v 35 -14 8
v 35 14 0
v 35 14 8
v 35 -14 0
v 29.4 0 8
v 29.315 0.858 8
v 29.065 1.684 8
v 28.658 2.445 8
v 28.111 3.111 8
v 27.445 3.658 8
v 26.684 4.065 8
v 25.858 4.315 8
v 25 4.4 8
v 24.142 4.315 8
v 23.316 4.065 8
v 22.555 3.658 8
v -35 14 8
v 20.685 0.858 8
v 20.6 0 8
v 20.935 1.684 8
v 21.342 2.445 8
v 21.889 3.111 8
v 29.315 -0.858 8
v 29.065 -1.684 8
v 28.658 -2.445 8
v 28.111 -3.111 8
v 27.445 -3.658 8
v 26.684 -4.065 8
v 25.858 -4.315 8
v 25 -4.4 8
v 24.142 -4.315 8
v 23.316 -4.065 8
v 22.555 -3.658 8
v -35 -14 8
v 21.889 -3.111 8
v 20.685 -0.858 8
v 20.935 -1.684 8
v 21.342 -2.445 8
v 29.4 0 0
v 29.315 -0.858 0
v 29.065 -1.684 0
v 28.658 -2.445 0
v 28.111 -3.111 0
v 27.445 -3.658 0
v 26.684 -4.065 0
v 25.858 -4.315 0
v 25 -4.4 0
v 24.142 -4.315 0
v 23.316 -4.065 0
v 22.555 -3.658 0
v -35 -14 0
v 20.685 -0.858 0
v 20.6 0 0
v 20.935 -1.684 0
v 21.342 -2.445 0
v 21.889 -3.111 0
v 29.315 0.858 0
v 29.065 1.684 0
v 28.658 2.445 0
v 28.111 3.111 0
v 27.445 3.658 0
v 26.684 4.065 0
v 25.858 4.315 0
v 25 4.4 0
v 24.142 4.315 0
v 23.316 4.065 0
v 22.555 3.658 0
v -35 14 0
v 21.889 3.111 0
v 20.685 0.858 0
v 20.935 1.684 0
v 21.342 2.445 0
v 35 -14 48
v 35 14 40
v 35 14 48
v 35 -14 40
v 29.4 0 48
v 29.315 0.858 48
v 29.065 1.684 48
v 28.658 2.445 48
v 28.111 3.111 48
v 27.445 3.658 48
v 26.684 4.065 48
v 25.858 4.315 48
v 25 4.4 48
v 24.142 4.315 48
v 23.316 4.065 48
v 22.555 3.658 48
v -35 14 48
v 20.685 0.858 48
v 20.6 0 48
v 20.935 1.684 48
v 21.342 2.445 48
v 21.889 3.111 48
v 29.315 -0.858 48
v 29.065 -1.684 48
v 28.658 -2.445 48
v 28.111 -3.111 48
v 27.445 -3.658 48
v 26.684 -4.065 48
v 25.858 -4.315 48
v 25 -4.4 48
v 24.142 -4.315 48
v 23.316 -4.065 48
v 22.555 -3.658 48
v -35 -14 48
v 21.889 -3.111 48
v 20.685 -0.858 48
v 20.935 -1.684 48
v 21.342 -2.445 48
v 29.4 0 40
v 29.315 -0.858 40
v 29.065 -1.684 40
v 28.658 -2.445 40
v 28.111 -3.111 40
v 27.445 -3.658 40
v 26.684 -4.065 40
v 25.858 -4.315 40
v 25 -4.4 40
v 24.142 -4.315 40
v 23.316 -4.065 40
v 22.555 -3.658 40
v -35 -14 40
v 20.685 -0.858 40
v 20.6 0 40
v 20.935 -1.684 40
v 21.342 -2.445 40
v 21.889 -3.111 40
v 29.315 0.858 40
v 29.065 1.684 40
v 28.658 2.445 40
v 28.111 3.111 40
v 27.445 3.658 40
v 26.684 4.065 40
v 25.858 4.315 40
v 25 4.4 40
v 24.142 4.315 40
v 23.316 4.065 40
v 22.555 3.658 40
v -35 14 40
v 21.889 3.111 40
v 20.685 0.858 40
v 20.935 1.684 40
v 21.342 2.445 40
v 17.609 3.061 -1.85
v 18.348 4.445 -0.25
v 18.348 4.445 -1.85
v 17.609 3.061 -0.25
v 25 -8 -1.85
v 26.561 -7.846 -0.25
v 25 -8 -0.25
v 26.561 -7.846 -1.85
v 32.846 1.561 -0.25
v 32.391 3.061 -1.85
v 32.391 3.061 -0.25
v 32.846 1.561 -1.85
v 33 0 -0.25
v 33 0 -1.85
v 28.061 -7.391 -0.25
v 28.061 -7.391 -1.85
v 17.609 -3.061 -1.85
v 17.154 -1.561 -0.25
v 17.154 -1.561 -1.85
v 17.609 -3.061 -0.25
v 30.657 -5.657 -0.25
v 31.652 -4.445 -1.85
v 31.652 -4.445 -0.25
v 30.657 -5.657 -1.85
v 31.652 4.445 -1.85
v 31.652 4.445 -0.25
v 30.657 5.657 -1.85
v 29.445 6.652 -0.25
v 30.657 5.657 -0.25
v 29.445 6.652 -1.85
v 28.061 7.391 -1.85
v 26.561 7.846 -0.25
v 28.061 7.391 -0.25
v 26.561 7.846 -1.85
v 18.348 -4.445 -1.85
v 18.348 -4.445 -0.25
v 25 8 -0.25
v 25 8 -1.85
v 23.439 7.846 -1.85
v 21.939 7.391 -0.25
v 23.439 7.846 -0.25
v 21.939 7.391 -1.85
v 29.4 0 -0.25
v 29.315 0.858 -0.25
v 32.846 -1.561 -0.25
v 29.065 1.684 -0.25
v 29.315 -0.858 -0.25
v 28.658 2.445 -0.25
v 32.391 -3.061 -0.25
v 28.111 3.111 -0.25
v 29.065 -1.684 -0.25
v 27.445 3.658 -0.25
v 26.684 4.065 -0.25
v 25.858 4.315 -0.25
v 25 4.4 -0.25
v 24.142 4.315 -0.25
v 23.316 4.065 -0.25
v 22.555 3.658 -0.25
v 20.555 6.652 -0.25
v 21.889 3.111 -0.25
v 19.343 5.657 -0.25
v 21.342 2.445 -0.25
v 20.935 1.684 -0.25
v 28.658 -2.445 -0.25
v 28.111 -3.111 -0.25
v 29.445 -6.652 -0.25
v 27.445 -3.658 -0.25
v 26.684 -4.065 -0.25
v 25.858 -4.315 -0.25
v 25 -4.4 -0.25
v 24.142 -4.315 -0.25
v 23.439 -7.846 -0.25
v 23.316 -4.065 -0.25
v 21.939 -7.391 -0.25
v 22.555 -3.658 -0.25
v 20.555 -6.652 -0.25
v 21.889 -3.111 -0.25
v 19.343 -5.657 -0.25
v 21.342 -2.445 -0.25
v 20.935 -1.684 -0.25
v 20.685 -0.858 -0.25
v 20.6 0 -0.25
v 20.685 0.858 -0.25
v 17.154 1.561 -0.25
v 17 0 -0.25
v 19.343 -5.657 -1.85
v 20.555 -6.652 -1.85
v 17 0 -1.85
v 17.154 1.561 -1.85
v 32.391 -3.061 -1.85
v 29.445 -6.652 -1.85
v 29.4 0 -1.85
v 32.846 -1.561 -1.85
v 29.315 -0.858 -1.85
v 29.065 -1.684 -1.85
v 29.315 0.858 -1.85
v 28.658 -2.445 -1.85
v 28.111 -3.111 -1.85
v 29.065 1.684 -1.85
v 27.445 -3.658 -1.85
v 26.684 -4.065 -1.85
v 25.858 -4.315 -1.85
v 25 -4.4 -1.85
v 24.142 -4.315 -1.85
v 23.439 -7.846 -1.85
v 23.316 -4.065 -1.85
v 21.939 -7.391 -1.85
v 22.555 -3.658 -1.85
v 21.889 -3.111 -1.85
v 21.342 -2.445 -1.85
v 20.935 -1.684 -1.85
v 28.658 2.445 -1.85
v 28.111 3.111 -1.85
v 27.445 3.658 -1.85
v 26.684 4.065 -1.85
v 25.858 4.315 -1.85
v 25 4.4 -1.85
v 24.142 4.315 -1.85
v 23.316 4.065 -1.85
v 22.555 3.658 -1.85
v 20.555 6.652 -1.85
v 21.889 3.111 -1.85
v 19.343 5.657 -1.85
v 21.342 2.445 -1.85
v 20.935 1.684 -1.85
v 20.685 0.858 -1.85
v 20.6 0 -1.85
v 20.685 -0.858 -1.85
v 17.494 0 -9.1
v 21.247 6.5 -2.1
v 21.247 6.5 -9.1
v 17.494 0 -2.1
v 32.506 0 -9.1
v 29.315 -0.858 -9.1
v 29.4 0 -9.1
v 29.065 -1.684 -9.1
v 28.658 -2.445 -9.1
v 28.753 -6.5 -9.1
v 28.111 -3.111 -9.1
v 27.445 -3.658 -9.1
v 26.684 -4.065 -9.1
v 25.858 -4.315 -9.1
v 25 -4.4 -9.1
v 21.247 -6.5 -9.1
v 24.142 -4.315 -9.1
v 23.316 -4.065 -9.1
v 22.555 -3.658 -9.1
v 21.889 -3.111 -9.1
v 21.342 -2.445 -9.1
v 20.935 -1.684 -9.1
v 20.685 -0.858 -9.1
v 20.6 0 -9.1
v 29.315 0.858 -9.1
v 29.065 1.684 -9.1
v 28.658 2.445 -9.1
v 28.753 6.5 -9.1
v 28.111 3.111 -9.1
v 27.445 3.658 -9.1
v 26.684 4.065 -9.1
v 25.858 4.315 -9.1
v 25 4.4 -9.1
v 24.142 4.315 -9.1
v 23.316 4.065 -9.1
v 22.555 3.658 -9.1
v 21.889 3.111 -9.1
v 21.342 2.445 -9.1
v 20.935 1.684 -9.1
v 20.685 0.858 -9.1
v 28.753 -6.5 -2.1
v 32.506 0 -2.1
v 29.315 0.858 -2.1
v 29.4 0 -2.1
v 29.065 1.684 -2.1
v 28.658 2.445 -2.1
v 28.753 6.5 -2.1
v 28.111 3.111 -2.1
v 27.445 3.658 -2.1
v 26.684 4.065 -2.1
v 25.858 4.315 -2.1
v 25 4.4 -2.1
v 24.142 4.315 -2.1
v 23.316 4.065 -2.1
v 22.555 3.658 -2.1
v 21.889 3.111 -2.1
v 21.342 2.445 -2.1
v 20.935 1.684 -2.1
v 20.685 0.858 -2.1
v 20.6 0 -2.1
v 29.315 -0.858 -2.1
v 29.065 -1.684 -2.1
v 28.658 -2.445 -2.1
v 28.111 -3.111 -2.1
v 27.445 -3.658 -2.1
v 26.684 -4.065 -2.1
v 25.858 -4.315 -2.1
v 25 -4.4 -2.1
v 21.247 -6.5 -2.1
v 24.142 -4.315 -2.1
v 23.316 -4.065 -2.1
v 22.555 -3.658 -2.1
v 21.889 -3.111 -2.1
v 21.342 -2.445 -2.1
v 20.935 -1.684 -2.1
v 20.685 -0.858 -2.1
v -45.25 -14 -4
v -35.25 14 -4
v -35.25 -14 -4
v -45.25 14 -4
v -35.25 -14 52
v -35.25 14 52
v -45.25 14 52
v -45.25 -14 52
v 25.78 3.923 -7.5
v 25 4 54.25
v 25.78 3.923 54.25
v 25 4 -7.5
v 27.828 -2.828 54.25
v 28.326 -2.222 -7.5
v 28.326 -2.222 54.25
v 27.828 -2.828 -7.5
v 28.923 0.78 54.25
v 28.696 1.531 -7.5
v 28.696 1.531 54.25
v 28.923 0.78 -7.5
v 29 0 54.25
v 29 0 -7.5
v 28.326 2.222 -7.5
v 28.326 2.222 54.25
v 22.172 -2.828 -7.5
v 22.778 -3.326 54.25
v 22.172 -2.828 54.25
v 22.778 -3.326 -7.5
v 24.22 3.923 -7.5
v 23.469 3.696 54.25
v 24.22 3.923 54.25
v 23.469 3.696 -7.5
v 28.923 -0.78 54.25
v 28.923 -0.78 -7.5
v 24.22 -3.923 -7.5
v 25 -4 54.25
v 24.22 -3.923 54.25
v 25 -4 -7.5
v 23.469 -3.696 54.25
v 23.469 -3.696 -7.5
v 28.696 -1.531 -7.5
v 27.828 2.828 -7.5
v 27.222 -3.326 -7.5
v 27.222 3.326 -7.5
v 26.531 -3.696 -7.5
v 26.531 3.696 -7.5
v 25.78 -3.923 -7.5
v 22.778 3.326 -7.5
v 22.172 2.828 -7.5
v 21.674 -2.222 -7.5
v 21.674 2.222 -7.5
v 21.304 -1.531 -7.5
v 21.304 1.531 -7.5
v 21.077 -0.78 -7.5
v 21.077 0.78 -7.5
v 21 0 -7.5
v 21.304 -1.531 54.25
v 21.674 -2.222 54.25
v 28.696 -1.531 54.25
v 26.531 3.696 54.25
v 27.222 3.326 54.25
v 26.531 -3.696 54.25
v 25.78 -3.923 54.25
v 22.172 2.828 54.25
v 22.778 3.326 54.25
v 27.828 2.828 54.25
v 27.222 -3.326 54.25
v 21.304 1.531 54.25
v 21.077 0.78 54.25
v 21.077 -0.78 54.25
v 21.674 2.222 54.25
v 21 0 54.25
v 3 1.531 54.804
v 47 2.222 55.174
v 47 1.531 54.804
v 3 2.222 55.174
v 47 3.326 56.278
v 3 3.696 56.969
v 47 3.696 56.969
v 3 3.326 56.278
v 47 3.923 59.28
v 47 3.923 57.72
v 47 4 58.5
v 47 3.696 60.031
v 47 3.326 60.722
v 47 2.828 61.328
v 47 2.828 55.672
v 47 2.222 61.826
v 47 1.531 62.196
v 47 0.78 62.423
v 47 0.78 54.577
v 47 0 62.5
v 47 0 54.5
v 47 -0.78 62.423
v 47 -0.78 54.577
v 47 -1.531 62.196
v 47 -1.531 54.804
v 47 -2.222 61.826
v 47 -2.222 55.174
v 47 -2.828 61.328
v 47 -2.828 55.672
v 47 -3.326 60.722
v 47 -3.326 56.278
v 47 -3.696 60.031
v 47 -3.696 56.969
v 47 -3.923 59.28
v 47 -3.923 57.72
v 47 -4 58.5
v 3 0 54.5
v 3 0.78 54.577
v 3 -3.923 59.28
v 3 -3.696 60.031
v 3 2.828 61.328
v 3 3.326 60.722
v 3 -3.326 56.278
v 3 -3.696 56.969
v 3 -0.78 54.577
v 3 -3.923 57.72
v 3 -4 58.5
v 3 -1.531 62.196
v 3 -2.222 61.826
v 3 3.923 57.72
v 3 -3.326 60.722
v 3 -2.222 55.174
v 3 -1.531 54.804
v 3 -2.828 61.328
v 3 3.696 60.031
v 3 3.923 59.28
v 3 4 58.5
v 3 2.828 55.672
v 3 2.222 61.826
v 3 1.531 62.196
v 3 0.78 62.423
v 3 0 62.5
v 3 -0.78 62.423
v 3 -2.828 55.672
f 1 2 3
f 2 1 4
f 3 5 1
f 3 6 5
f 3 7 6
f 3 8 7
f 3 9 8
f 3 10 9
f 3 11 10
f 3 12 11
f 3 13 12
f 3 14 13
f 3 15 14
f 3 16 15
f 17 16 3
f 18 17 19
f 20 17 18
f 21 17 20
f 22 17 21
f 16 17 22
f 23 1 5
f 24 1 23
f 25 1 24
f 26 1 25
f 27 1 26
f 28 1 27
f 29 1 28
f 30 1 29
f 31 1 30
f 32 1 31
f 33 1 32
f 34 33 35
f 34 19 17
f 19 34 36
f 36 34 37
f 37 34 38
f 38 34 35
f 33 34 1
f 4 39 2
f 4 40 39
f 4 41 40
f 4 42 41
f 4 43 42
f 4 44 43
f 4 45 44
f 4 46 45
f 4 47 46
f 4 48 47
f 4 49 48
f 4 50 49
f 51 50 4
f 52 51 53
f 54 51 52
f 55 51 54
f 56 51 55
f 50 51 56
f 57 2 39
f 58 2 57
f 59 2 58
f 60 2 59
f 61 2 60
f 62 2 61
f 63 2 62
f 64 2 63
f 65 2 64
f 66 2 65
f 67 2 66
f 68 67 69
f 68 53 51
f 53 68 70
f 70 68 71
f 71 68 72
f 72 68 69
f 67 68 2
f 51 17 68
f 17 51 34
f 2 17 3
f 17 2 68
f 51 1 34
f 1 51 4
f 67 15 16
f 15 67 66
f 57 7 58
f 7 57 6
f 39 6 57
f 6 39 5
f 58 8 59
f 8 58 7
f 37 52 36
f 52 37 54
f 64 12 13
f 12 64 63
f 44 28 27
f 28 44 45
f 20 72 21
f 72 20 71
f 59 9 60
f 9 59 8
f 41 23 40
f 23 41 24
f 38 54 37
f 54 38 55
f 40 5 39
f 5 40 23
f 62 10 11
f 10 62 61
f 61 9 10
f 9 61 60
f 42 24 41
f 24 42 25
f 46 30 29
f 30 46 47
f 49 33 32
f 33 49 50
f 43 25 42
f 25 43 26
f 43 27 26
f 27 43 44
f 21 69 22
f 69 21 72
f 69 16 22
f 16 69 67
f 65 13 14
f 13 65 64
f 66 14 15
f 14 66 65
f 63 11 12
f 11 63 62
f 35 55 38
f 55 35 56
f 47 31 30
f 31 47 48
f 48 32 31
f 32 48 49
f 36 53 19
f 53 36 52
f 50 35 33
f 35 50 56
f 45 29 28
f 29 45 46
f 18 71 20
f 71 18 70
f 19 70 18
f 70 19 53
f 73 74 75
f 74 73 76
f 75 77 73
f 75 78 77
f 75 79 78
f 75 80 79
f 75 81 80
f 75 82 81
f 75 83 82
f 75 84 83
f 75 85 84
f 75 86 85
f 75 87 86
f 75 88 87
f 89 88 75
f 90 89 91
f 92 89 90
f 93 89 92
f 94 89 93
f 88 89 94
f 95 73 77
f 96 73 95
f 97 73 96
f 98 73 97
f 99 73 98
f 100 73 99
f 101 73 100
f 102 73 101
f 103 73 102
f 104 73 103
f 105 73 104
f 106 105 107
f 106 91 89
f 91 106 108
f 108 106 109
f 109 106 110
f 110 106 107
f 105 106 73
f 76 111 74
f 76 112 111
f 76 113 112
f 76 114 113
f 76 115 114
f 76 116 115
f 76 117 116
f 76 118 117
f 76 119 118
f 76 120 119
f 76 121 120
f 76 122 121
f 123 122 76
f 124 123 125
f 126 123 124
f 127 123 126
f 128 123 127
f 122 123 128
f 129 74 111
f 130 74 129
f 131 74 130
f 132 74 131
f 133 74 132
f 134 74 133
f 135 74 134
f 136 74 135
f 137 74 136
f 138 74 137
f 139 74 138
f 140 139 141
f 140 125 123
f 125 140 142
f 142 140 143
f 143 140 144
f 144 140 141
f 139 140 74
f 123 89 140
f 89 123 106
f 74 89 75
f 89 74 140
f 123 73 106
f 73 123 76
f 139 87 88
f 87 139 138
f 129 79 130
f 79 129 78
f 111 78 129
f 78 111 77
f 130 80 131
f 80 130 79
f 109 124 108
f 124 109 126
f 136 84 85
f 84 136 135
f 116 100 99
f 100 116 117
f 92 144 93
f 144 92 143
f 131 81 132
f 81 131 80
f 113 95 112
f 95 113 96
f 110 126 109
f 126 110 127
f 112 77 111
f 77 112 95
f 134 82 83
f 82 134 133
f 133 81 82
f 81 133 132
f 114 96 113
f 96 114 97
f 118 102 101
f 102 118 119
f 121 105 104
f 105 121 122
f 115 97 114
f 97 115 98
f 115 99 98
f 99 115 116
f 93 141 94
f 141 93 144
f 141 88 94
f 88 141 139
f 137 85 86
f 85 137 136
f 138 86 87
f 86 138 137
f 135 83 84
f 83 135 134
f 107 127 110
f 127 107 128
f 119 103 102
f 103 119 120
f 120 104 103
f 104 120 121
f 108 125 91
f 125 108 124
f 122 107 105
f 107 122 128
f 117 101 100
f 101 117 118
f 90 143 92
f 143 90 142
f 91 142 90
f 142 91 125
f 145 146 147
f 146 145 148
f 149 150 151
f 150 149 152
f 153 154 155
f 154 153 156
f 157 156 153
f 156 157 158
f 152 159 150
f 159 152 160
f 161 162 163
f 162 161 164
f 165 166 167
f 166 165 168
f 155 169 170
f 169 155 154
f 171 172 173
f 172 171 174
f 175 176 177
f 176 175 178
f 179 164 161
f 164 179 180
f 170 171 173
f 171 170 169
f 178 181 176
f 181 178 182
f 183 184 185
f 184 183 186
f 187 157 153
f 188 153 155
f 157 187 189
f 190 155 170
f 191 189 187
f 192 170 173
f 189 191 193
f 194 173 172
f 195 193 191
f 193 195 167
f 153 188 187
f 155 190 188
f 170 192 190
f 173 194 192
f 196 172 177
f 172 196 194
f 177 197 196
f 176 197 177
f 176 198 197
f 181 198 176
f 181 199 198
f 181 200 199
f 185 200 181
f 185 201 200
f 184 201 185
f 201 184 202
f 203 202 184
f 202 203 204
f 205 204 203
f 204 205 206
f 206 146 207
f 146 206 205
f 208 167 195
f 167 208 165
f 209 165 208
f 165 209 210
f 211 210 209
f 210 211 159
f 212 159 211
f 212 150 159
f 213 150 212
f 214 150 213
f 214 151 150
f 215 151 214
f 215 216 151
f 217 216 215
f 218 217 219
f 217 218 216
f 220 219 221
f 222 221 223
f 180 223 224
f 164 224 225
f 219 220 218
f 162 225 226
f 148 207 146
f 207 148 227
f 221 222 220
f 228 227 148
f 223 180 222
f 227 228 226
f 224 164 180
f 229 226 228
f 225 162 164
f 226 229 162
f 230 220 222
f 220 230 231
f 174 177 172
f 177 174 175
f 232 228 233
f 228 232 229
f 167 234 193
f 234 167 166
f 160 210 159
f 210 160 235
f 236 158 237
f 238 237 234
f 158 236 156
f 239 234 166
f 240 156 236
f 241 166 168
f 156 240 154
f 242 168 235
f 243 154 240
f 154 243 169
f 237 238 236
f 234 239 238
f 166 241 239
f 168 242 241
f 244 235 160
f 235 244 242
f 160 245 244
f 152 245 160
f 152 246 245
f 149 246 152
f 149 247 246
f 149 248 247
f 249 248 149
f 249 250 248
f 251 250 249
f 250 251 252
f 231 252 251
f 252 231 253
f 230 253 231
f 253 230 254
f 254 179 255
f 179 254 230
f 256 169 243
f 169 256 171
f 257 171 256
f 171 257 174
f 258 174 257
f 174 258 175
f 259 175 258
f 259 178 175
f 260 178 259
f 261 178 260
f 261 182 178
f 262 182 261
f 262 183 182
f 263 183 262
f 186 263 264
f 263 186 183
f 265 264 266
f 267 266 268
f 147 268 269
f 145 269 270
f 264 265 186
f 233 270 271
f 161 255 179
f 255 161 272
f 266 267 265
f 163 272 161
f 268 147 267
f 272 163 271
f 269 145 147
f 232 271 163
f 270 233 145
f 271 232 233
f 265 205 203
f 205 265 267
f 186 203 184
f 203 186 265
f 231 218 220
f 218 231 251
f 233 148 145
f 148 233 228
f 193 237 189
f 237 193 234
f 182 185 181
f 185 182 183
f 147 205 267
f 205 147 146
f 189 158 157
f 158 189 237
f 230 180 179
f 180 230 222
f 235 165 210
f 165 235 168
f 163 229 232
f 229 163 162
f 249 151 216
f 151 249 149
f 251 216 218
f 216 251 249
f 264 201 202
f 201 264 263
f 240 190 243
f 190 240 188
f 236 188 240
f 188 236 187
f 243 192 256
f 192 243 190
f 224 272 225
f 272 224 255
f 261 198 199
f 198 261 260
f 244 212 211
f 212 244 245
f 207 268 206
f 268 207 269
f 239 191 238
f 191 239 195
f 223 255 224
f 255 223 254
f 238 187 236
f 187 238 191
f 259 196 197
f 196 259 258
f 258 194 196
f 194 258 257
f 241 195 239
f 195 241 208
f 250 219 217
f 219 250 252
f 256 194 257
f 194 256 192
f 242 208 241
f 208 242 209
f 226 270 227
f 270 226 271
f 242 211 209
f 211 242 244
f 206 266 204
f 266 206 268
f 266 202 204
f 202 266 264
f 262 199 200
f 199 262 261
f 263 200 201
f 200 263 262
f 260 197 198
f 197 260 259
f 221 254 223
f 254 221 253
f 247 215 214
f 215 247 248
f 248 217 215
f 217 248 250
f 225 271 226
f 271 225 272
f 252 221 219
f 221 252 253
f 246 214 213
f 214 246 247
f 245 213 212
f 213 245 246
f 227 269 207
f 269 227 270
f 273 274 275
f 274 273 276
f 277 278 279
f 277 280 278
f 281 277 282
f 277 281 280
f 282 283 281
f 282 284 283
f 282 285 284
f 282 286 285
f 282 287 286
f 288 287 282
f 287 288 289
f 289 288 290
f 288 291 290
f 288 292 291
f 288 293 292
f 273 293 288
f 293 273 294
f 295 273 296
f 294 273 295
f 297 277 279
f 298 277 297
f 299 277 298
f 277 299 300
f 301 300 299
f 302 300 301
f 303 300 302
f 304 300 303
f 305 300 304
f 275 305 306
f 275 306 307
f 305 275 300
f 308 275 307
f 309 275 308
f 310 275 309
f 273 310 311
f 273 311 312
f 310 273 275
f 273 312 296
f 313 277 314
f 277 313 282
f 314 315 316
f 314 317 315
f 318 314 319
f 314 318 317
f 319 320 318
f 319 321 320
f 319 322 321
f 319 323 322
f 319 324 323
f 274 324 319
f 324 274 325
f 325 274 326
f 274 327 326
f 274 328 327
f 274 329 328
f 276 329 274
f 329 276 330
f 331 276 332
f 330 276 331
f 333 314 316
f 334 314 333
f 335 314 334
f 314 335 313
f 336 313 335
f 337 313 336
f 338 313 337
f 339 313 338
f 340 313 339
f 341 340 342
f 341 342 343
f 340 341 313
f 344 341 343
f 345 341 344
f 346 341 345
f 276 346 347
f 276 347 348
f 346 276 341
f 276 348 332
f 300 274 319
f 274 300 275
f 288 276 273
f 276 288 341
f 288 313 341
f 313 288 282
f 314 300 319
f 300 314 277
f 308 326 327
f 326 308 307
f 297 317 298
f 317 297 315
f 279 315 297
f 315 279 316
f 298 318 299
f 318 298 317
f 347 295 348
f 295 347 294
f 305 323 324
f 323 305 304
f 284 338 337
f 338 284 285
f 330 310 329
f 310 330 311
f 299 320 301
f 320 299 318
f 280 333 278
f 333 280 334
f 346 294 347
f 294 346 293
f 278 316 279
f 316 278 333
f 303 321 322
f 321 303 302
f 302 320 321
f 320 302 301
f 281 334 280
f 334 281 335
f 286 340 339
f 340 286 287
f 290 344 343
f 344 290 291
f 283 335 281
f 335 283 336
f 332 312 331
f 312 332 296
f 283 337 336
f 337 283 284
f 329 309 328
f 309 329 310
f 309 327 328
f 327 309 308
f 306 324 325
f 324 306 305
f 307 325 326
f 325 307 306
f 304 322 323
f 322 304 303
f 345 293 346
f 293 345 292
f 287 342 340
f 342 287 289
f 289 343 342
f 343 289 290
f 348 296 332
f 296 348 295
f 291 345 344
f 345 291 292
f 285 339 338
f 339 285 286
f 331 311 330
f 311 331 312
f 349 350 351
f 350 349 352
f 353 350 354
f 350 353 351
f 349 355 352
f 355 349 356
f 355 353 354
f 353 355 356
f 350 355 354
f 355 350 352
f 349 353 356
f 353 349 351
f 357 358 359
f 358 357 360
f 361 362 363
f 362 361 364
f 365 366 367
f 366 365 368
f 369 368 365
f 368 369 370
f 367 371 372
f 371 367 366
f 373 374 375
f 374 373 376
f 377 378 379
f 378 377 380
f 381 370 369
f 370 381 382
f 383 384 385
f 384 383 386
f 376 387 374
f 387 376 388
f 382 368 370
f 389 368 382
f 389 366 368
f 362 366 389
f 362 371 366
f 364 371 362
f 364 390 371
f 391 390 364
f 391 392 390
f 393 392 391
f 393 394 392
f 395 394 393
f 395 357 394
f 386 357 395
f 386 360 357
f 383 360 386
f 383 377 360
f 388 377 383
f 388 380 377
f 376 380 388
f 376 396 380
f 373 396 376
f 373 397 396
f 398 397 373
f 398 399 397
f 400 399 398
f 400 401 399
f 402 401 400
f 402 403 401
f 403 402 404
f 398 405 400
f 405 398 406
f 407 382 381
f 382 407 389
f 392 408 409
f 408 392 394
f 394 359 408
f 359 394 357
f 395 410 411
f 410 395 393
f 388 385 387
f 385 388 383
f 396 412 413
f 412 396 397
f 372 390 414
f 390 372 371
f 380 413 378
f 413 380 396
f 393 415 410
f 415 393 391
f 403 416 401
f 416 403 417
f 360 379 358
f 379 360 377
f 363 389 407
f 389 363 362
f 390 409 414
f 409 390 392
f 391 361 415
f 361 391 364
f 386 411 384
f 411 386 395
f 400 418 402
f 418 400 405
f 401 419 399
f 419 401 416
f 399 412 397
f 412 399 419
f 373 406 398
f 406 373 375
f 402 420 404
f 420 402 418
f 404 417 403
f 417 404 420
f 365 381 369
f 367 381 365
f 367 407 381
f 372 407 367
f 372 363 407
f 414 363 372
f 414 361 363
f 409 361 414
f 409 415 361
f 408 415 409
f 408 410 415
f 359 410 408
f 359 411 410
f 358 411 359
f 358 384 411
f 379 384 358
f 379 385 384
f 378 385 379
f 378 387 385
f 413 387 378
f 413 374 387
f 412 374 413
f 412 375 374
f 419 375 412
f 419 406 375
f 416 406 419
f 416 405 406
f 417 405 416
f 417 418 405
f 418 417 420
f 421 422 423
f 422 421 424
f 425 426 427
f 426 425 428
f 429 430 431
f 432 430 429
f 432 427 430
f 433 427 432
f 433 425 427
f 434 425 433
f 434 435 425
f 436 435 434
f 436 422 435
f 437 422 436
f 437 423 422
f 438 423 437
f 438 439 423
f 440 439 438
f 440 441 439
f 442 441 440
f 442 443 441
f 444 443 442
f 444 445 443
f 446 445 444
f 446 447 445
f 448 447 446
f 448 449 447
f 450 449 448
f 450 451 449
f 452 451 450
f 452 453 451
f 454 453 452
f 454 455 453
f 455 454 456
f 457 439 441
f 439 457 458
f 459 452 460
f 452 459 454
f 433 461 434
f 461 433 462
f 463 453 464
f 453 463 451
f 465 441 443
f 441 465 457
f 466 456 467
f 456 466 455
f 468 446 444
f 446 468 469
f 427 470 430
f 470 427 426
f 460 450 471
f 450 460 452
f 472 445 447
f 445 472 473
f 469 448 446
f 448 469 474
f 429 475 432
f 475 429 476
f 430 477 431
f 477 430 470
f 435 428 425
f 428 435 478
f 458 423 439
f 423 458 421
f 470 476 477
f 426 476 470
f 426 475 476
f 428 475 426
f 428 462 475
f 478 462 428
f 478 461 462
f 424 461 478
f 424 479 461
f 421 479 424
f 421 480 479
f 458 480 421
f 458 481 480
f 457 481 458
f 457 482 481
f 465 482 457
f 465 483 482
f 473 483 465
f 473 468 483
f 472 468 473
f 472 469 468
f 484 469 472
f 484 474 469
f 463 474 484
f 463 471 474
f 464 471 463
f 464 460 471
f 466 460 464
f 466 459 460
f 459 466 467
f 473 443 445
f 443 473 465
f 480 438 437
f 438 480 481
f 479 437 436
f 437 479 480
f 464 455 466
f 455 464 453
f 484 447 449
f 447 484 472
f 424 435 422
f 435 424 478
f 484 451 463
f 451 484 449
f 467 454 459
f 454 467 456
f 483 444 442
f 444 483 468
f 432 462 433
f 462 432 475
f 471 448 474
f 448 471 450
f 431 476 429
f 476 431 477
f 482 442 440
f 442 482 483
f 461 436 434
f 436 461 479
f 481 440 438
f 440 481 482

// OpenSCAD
$fn = 32;

// ------------------------------------------------------------------------
// C clamp: throat 40 mm, screw d8
// Every part is its own module, assembly() places every instance.
// ------------------------------------------------------------------------

// --- part 1 ---
module clamp_arm() {
  difference() {
    translate([-35, -14, 0]) cube([70, 28, 8]);
    translate([25, 0, -1]) cylinder(h = 10, d = 8.8);
  }
}

// --- part 2 ---
module clamp_spine() {
  difference() {
    translate([-28, -14, 0]) cube([56, 28, 10]);
  }
}

// --- part 3 ---
module clamp_screw() {
  translate([0, 0, -30.875]) cylinder(h = 61.75, d = 8);
}

// --- part 4 ---
module clamp_washer() {
  difference() {
      translate([0, 0, 0]) cylinder(h = 1.6, d = 16);
      translate([0, 0, -1]) cylinder(h = 3.6, d = 8.8);
    }
}

// --- part 5 ---
module clamp_nut() {
  difference() {
    linear_extrude(height = 7) polygon(points = [[7.506, 0], [3.753, 6.5], [-3.753, 6.5], [-7.506, 0], [-3.753, -6.5], [3.753, -6.5]]);
    translate([0, 0, -1]) cylinder(h = 9, d = 8.8);
  }
}

// --- part 6 ---
module tommy_bar() {
  translate([0, 0, -22]) cylinder(h = 44, d = 8);
}

// --- assembly ---
module assembly() {
  color([0.80, 0.24, 0.20]) translate([0, 0, 0]) rotate([0, 0, 0]) clamp_arm();
  color([0.20, 0.45, 0.75]) translate([0, 0, 40]) rotate([0, 0, 0]) clamp_arm();
  color([0.25, 0.62, 0.32]) translate([-45.25, 0, 24]) rotate([0, 90, 0]) clamp_spine();
  color([0.92, 0.70, 0.18]) translate([25, 0, 23.375]) rotate([0, 0, 0]) clamp_screw();
  color([0.58, 0.35, 0.70]) translate([25, 0, -1.85]) rotate([0, 0, 0]) clamp_washer();
  color([0.16, 0.66, 0.66]) translate([25, 0, -9.1]) rotate([0, 0, 0]) clamp_nut();
  color([0.85, 0.48, 0.18]) translate([25, 0, 58.5]) rotate([0, 90, 0]) tommy_bar();
}

assembly();
